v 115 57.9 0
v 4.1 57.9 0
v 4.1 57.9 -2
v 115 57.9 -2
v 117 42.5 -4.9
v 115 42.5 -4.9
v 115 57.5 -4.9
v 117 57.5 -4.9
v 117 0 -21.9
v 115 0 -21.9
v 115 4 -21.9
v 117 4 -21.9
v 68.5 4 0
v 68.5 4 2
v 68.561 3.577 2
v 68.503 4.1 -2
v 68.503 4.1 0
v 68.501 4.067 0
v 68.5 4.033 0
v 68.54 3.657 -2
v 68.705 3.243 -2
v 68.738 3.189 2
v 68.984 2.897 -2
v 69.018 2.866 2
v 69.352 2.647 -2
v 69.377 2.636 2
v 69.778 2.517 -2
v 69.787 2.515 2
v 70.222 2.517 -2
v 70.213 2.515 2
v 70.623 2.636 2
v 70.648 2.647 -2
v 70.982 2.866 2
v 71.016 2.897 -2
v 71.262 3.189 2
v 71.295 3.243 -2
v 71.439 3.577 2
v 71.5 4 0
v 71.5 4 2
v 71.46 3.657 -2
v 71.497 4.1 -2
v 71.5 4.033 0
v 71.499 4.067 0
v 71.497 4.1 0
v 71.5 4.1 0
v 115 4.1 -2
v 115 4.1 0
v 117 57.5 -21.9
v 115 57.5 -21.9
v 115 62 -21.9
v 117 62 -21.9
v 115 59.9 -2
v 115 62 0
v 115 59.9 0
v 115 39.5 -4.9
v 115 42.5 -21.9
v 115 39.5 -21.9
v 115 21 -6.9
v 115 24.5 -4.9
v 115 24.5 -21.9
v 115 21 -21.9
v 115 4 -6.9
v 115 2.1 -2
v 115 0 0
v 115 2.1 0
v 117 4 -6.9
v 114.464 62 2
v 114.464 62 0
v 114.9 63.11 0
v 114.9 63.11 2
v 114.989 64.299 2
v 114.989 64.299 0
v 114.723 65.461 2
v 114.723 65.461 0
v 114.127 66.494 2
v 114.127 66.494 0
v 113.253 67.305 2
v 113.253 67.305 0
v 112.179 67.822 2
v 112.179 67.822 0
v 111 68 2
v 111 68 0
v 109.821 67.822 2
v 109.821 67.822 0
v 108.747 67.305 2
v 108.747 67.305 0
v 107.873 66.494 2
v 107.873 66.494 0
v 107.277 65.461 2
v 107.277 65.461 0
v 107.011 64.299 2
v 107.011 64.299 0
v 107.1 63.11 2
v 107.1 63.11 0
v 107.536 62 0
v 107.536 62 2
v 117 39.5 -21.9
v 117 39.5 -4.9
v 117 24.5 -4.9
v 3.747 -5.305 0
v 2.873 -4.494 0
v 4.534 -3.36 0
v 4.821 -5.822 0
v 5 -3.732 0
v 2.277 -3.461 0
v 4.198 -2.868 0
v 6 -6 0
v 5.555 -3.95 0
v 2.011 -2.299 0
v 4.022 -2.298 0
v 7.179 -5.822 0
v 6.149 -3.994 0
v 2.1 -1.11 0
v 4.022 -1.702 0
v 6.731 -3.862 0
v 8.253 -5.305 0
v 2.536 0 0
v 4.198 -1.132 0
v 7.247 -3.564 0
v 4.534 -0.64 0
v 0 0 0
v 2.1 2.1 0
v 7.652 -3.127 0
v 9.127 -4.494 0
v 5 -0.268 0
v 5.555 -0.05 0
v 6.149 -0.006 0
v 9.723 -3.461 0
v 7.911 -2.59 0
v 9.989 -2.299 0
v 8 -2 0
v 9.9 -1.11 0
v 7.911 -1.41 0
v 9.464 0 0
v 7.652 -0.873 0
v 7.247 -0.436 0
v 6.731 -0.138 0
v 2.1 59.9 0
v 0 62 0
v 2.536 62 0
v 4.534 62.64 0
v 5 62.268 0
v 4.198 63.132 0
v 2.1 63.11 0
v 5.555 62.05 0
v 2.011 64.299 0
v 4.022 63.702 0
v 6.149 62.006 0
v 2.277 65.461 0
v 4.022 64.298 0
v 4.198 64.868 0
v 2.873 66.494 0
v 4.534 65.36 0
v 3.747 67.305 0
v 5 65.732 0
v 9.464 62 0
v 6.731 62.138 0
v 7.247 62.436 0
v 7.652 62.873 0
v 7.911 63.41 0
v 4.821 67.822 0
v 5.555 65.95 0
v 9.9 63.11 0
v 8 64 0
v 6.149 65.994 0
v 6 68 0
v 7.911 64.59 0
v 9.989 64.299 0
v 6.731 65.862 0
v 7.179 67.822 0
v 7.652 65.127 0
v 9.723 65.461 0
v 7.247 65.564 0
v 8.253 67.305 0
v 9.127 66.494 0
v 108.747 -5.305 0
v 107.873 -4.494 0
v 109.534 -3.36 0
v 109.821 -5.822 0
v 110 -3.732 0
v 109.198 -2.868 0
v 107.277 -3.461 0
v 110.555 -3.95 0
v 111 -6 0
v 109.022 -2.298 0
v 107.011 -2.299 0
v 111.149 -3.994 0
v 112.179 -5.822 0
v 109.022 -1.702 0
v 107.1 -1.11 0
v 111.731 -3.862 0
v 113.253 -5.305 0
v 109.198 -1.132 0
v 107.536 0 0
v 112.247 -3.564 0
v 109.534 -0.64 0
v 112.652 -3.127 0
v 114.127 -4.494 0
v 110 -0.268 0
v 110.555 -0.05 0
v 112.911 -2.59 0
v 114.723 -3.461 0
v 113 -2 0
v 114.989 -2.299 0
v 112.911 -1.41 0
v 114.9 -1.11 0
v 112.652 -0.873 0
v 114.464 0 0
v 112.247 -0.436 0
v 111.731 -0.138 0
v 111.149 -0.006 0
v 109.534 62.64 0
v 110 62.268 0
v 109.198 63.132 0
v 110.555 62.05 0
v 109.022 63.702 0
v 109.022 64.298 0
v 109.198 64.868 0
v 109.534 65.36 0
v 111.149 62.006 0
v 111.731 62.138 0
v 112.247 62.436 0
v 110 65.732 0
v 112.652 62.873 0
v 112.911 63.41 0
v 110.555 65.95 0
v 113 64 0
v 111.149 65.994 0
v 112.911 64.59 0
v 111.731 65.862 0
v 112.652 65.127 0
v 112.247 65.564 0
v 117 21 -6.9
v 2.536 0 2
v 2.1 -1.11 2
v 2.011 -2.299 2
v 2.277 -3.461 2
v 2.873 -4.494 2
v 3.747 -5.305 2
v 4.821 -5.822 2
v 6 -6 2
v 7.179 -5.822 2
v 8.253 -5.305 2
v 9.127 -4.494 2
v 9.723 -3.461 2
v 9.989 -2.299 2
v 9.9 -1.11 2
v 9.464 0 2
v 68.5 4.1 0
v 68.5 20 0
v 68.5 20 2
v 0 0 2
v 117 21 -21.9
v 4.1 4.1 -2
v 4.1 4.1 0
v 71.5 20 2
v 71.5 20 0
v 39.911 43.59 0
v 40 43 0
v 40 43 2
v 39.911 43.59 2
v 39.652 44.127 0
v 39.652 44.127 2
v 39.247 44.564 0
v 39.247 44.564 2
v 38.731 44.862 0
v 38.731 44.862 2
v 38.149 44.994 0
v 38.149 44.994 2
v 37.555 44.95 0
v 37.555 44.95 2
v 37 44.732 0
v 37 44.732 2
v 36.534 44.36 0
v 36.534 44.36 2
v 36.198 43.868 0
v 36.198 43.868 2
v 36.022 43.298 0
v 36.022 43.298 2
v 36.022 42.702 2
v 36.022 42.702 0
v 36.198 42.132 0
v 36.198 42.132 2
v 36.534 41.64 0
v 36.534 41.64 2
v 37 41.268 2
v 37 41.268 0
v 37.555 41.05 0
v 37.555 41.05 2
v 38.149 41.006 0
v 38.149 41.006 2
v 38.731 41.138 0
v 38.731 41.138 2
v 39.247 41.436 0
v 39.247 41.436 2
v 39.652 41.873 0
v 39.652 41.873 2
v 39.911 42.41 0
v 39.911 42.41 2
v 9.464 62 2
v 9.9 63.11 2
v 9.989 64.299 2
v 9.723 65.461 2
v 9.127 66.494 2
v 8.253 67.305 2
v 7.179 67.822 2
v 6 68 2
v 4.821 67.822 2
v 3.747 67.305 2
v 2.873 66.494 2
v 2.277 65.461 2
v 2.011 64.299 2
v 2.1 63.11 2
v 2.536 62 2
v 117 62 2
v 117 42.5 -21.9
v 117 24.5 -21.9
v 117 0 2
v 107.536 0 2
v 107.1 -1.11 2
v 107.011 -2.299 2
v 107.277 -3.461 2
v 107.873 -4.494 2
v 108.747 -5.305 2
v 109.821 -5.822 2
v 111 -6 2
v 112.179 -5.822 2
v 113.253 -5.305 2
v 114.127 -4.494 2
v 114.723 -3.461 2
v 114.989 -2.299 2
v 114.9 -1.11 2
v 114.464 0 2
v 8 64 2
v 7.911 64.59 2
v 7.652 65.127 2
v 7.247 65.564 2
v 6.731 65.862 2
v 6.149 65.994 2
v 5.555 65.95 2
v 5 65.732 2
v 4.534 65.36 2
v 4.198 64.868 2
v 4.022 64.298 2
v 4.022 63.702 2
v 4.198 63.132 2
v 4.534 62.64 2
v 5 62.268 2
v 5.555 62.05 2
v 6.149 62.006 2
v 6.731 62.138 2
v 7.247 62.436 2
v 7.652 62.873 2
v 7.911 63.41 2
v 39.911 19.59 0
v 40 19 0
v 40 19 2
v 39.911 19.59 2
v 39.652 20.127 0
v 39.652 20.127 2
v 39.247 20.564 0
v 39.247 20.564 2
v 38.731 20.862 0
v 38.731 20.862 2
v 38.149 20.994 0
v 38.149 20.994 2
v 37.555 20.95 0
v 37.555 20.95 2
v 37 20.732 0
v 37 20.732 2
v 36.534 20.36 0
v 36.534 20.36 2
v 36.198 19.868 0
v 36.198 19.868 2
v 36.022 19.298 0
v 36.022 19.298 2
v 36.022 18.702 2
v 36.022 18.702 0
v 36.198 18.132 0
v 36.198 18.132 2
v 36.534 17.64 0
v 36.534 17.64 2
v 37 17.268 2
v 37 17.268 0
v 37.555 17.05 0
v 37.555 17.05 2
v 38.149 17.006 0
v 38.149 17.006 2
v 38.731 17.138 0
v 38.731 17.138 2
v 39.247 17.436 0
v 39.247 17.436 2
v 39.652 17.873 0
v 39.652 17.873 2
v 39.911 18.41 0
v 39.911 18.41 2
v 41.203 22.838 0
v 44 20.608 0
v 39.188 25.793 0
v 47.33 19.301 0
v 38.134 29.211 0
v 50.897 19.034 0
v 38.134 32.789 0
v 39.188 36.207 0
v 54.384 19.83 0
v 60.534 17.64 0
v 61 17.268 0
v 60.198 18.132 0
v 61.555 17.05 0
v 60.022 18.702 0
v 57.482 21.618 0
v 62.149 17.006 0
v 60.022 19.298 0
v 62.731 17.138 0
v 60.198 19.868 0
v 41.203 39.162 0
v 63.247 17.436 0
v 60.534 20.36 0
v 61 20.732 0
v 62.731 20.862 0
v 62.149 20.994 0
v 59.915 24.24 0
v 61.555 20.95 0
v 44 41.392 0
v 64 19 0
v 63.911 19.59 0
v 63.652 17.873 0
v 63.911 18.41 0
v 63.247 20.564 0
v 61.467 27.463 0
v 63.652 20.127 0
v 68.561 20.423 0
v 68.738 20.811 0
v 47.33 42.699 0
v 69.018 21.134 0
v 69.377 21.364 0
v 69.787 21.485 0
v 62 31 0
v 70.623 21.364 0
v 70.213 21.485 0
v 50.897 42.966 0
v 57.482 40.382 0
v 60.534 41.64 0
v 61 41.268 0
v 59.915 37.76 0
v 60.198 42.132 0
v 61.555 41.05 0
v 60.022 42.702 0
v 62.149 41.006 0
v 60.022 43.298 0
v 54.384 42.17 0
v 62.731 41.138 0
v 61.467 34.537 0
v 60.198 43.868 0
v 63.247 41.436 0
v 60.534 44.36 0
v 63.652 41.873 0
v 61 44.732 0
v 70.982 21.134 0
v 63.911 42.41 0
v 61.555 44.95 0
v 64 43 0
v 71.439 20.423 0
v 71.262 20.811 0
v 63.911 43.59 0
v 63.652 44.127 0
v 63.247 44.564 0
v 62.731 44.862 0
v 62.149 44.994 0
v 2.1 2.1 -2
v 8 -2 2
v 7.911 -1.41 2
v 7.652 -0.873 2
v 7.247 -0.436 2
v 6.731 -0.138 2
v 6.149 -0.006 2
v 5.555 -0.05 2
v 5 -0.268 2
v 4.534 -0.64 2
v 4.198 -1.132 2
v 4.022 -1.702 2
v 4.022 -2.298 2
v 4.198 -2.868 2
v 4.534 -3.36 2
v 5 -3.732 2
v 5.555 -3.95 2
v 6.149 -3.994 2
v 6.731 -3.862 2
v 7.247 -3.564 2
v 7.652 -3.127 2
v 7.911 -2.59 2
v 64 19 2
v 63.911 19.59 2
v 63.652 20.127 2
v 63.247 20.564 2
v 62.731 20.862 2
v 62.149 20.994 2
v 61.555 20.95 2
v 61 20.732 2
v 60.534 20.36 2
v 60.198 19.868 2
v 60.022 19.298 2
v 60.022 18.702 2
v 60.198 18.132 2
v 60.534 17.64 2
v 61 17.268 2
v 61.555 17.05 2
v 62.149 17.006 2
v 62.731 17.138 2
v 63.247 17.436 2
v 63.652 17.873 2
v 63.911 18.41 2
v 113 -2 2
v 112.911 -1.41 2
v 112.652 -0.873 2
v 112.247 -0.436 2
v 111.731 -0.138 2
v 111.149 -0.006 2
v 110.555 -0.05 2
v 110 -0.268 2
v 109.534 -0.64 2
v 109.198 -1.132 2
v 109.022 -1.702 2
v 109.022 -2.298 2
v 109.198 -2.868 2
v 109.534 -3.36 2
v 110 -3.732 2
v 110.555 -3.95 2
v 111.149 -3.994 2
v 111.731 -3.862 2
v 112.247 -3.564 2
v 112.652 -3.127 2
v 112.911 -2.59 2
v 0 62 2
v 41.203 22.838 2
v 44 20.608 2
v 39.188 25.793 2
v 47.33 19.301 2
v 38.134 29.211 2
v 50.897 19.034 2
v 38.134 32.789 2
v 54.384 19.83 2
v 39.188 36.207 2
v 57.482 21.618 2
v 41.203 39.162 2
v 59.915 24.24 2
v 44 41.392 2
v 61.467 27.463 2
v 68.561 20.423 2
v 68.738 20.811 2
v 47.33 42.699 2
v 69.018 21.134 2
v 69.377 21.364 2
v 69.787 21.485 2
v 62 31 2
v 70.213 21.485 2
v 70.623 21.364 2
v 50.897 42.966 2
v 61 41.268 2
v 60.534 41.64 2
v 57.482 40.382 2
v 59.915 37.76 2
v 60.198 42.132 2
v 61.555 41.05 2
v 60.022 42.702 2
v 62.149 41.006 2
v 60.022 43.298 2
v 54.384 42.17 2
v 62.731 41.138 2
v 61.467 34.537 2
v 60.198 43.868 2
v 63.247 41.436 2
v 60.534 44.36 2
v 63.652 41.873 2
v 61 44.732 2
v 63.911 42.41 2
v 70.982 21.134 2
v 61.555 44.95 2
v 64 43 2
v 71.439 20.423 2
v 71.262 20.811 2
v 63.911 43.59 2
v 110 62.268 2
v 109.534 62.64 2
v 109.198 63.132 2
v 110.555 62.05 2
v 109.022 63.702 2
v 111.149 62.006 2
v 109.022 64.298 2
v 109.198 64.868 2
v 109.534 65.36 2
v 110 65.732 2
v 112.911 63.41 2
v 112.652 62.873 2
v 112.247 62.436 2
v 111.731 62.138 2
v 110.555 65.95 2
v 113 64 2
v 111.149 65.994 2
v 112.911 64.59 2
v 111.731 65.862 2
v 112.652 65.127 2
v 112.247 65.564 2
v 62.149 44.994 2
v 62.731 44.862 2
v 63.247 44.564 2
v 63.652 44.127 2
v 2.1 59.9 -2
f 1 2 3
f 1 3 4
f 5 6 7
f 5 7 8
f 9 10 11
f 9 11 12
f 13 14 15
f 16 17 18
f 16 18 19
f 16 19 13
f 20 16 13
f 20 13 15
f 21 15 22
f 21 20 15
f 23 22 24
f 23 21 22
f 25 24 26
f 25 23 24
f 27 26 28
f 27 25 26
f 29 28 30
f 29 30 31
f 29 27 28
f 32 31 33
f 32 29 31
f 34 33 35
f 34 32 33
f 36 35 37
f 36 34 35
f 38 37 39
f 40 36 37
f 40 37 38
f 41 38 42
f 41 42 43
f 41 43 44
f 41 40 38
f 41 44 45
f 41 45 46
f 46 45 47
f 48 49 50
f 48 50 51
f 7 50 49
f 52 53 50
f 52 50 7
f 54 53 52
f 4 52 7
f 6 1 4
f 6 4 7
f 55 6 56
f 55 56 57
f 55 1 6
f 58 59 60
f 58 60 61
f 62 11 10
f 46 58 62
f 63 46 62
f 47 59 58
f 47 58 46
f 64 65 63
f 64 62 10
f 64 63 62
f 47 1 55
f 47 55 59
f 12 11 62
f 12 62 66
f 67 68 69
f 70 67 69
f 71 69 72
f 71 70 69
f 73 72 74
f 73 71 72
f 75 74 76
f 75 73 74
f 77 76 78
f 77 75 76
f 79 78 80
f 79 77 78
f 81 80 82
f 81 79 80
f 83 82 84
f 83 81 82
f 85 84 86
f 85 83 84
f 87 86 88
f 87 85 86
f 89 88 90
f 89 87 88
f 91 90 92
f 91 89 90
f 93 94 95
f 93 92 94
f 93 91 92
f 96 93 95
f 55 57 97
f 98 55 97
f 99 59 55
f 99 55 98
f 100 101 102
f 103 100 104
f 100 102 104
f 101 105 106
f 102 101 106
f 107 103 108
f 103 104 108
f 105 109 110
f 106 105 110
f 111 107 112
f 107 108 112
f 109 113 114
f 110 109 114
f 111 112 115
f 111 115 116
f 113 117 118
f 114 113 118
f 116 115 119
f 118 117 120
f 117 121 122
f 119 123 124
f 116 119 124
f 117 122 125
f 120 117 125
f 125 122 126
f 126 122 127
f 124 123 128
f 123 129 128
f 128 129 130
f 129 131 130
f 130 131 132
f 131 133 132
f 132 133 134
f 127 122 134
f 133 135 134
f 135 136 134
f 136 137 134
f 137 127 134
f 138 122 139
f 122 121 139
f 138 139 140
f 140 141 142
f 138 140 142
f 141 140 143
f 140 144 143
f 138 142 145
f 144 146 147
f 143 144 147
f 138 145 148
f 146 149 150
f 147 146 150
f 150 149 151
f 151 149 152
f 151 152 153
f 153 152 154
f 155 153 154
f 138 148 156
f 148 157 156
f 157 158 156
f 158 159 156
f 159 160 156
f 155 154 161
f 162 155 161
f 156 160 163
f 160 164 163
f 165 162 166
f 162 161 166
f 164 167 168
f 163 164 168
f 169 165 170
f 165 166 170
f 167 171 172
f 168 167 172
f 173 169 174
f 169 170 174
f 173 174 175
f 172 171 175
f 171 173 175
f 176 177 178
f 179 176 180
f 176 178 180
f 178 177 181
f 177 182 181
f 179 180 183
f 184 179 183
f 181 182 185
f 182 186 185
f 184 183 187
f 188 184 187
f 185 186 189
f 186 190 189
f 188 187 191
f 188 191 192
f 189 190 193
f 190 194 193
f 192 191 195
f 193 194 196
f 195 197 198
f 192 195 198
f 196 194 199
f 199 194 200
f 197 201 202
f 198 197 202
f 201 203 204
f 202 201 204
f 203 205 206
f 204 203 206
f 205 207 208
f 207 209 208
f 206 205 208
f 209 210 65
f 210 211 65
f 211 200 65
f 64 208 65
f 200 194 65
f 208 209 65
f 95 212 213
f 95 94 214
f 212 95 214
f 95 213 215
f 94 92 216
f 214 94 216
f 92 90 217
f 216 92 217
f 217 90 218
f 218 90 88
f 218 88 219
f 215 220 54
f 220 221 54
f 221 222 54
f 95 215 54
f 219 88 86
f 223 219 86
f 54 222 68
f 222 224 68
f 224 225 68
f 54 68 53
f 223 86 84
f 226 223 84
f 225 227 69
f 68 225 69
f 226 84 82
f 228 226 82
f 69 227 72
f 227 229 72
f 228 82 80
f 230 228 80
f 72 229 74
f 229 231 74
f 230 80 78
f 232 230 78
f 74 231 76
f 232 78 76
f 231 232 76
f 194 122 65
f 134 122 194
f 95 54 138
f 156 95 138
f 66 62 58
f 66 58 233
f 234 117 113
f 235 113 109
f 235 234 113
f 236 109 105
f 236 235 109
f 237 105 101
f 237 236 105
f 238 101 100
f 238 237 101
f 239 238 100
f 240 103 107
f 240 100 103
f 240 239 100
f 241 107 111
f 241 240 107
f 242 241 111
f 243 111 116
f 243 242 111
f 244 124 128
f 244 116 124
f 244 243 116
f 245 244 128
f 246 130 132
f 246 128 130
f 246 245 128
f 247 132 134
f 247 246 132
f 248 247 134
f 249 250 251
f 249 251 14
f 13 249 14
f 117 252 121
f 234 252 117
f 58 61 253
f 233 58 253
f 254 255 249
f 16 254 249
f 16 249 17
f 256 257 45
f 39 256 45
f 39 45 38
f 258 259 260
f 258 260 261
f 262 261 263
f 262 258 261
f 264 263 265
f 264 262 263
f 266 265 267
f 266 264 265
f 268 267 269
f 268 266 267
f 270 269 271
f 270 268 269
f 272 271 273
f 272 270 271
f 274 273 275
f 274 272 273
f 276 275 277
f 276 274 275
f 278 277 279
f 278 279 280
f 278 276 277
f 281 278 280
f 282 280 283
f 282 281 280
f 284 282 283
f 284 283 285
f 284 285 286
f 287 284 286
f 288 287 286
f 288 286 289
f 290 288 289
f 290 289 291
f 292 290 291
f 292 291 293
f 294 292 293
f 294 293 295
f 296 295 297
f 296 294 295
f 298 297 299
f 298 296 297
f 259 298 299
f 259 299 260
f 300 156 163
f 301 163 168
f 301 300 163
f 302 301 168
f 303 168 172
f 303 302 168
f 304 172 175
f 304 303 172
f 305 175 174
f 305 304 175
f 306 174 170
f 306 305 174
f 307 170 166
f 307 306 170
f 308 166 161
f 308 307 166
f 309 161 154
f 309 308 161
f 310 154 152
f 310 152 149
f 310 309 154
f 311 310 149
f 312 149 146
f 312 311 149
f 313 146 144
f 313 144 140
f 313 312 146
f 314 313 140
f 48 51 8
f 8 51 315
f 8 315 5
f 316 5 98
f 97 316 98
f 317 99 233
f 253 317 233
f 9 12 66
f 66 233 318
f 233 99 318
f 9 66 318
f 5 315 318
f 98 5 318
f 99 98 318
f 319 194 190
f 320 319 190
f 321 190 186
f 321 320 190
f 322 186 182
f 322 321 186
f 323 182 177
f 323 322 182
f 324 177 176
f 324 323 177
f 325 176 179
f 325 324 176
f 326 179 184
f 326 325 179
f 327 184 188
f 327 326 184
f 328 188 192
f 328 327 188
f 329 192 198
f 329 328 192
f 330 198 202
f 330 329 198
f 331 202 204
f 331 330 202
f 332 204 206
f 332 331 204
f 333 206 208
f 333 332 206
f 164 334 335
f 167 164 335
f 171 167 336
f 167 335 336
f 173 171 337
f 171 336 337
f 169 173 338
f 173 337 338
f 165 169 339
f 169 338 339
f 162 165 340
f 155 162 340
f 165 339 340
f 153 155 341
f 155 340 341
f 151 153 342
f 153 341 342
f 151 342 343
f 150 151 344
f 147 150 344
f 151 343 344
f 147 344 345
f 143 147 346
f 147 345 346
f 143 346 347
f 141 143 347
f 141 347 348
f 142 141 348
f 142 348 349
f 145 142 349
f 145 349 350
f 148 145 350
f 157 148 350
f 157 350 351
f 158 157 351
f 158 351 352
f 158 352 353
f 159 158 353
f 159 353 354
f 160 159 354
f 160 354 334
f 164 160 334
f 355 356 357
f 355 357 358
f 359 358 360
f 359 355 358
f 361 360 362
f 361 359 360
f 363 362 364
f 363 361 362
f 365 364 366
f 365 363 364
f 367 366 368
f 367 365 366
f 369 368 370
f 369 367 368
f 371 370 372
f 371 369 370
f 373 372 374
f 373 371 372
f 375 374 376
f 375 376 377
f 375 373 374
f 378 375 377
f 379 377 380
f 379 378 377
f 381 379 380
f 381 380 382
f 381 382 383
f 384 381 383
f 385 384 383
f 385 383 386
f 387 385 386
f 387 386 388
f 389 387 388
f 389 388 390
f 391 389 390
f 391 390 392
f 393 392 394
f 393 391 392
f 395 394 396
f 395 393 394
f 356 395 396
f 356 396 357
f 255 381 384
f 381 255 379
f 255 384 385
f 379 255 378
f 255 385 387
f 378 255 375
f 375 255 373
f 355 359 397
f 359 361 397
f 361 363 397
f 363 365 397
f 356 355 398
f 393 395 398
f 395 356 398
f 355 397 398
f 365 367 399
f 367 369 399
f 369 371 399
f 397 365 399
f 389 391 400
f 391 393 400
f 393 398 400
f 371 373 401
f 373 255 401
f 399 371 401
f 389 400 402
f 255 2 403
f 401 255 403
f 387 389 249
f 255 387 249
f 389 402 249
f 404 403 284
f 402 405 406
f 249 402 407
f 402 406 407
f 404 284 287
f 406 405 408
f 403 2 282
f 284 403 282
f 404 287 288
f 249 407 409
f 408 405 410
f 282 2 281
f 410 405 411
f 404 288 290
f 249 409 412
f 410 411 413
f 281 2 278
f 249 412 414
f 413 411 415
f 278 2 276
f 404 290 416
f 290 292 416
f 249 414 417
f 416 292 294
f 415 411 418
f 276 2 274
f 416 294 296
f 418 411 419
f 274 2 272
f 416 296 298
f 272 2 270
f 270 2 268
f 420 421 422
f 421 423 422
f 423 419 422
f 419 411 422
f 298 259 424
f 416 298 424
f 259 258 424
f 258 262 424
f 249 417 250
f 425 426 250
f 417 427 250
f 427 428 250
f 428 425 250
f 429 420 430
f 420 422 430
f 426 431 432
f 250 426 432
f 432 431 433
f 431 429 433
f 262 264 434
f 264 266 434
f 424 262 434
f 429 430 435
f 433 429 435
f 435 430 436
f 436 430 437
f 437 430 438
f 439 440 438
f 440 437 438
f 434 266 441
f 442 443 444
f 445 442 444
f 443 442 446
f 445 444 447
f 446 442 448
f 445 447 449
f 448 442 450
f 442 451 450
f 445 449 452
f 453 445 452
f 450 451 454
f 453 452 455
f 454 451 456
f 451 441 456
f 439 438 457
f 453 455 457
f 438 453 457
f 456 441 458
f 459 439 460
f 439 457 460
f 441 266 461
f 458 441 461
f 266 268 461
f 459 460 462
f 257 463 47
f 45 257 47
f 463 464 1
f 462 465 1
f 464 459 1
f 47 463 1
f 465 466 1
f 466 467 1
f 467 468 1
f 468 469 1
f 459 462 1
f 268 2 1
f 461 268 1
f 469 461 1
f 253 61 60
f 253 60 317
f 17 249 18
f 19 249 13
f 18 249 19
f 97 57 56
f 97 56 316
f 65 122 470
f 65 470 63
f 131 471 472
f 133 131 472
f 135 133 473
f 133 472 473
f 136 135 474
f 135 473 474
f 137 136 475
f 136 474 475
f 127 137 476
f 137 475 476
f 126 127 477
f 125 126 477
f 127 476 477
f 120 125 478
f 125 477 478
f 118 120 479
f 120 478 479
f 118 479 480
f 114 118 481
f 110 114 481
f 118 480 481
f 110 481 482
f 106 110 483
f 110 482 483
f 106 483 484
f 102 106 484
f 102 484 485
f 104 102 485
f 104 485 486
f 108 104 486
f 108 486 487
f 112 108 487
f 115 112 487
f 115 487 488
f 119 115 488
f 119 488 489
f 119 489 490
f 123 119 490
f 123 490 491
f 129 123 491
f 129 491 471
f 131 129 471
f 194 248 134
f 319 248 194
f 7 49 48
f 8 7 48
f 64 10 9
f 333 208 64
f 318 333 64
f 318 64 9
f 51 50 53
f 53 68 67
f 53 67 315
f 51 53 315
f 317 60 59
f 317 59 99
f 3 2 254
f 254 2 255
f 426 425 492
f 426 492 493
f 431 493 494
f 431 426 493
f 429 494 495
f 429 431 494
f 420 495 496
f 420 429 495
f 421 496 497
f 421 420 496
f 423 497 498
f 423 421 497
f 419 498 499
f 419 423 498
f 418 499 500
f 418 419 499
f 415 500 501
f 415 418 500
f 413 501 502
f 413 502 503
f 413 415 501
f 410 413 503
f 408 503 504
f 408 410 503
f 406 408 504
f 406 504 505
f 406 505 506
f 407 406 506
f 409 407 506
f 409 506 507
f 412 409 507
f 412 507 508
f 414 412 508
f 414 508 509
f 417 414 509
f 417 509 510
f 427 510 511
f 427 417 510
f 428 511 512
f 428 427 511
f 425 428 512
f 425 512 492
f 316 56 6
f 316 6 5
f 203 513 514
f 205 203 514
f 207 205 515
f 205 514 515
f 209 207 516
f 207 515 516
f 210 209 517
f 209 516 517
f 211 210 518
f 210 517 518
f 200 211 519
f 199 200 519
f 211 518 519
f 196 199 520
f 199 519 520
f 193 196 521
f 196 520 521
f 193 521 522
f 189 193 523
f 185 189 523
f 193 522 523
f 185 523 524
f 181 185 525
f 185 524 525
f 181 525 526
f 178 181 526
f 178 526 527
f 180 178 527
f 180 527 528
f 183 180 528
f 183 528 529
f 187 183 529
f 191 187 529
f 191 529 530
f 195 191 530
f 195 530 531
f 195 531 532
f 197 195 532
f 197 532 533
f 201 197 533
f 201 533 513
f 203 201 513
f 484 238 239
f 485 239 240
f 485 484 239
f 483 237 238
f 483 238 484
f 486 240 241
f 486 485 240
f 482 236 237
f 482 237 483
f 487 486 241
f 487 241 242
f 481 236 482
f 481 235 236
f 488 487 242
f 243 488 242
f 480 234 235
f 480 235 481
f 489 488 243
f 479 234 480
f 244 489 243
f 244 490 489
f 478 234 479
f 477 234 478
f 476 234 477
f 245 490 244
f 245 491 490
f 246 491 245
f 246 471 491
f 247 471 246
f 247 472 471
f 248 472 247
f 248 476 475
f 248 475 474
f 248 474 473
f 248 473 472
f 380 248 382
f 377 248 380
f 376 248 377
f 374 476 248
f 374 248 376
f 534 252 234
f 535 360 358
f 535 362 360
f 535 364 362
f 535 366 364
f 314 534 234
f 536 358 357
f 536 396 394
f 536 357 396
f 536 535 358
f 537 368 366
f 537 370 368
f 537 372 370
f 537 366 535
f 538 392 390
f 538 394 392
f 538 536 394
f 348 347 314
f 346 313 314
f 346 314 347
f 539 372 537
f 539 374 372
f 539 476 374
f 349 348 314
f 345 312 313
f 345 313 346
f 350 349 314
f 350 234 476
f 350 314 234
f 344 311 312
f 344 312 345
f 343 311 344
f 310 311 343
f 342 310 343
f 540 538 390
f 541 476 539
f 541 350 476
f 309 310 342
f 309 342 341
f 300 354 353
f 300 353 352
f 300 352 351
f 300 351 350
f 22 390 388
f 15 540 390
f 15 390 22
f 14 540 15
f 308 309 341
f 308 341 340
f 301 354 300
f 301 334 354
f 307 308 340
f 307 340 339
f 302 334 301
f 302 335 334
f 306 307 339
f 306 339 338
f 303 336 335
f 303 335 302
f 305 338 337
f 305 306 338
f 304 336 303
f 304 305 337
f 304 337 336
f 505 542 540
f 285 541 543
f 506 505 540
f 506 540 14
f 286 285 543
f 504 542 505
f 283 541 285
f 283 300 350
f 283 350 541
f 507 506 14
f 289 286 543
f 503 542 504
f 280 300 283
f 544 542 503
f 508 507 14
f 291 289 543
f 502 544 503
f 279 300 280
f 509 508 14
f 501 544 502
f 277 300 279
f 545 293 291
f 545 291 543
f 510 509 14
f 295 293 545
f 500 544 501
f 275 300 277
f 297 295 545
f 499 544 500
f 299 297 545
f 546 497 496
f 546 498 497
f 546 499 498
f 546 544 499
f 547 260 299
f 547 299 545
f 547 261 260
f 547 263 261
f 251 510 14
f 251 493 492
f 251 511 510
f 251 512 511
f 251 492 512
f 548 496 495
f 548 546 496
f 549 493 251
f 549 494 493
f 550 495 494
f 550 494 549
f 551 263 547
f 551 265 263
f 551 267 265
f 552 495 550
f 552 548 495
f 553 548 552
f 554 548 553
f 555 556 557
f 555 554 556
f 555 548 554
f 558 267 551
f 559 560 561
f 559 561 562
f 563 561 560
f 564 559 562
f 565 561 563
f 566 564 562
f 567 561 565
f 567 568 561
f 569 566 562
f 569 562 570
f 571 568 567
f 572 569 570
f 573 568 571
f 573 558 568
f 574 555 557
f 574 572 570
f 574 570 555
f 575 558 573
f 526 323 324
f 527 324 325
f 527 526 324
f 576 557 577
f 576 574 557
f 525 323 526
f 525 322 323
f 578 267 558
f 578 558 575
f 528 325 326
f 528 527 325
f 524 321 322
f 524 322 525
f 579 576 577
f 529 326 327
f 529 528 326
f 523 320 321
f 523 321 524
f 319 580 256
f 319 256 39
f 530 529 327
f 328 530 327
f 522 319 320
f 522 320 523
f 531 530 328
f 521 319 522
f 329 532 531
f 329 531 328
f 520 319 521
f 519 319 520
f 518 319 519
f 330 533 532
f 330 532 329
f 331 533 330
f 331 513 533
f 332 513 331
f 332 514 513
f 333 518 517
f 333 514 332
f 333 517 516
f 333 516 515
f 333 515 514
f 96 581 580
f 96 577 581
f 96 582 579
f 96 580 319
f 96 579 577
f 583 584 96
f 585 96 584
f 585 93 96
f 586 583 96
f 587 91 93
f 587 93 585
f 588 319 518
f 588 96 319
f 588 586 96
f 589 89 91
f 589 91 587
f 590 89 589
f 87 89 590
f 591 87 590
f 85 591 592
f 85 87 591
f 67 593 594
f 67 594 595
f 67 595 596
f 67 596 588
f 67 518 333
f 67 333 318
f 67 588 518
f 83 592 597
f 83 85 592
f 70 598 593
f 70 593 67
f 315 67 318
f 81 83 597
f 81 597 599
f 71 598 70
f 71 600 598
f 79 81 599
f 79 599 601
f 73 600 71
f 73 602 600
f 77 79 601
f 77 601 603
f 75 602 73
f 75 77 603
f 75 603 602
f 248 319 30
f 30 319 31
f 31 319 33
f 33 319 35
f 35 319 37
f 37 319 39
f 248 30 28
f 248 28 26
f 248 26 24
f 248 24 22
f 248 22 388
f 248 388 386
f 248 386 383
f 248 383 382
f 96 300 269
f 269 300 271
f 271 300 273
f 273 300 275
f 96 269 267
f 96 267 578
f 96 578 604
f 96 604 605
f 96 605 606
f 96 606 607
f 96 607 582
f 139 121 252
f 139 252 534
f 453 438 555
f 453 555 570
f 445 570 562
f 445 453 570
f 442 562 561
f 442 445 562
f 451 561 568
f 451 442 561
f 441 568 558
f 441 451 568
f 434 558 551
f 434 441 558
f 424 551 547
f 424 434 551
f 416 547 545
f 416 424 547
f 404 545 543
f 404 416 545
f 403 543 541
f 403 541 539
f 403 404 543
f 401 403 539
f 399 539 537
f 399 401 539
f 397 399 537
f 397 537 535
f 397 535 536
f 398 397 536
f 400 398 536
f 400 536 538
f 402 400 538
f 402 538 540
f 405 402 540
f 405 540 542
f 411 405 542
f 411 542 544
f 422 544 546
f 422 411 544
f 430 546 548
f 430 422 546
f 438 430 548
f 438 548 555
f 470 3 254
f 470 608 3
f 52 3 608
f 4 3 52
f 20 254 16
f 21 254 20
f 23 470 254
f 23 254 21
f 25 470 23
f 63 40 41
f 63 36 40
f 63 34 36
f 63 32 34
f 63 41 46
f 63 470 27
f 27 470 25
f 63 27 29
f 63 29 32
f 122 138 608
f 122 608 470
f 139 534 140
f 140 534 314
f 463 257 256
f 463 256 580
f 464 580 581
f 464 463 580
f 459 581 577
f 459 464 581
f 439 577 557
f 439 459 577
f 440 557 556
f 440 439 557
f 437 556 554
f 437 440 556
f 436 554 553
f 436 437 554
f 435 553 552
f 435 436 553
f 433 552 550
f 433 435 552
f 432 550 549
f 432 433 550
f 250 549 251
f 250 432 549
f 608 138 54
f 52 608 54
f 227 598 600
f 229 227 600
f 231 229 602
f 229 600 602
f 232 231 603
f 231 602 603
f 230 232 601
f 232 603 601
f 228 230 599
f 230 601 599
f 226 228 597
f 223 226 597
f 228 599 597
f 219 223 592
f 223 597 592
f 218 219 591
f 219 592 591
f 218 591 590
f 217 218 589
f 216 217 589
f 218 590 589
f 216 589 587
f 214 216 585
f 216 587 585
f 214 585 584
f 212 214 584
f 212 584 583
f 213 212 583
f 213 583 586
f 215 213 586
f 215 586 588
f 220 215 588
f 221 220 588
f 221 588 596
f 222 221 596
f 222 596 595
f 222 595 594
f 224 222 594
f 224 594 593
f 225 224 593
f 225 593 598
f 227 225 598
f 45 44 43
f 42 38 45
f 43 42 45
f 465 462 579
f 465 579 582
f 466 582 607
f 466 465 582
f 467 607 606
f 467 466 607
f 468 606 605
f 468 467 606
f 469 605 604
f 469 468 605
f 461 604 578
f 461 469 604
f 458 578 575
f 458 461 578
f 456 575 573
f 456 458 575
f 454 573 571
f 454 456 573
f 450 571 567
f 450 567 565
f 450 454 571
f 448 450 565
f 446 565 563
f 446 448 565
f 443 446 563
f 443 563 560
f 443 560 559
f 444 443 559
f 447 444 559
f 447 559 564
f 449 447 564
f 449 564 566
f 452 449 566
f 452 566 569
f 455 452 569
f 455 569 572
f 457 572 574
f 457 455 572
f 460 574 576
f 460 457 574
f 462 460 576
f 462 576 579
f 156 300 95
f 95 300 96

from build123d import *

# Parameters (mm, degrees)
SKETCH_W        = 117
SKETCH_H        = 62
SKETCH_R        = 2
SKETCH_R_2      = 12
PAD_DEPTH       = 2
SKETCH001_W     = 114.9
SKETCH001_H     = 57.8
SKETCH001_W_2   = 110.9
SKETCH001_H_2   = 53.8
SKETCH001_W_3   = 2
SKETCH001_H_3   = 2.1
PAD001_DEPTH    = 2
SKETCH003_R     = 2
POCKET_DEPTH    = 2
SKETCH005_W     = 2
SKETCH005_H     = 62
PAD002_DEPTH    = 19.9
SKETCH006_W     = 2
SKETCH006_H     = 17
POCKET001_DEPTH = 15
SKETCH007_W     = 2
SKETCH007_H     = 15
POCKET002_DEPTH = 17
SKETCH008_R     = 4
SKETCH008_R_2   = 2
PAD003_DEPTH    = 2
SKETCH009_R     = 1.5
POCKET003_DEPTH = 5


with BuildPart() as part:
    # Sketch → Pad (new body)
    with BuildSketch(Plane.XY):
        with Locations((58.5, 31)):
            Rectangle(SKETCH_W, SKETCH_H)
        with Locations((38, 43)):
            Circle(SKETCH_R, mode=Mode.SUBTRACT)
        with Locations((62, 43)):
            Circle(SKETCH_R, mode=Mode.SUBTRACT)
        with Locations((38, 19)):
            Circle(SKETCH_R, mode=Mode.SUBTRACT)
        with Locations((62, 19)):
            Circle(SKETCH_R, mode=Mode.SUBTRACT)
        with Locations((50, 31)):
            Circle(SKETCH_R_2, mode=Mode.SUBTRACT)
        with BuildLine():
            ThreePointArc((71.5, 20), (70, 21.5), (68.5, 20))
            Line((68.5, 20), (68.5, 4))
            ThreePointArc((68.5, 4), (70, 2.5), (71.5, 4))
            Line((71.5, 20), (71.5, 4))
        make_face(mode=Mode.SUBTRACT)
    extrude(amount=PAD_DEPTH)

    # Sketch001 (on Face14 of Pad) → Pad001 (join)
    with BuildSketch(Plane(origin=(0, 0, 0), x_dir=(1, 0, 0), z_dir=(0, 0, -1))):
        with Locations((59.55, -31)):
            Rectangle(SKETCH001_W, SKETCH001_H)
        with Locations((59.55, -31)):
            Rectangle(SKETCH001_W_2, SKETCH001_H_2, mode=Mode.SUBTRACT)
        with Locations((116, -1.05)):
            Rectangle(SKETCH001_W_3, SKETCH001_H_3)
        with Locations((116, -60.95)):
            Rectangle(SKETCH001_W_3, SKETCH001_H_3)
    extrude(amount=PAD001_DEPTH)

    # Sketch003 → Pocket (cut)
    with BuildSketch(Plane.XY.offset(2)):
        with Locations((6, 64)):
            Circle(SKETCH003_R)
        with Locations((113, 64)):
            Circle(SKETCH003_R)
        with Locations((6, -2)):
            Circle(SKETCH003_R)
        with Locations((113, -2)):
            Circle(SKETCH003_R)
    extrude(amount=-POCKET_DEPTH, mode=Mode.SUBTRACT)

    # Sketch005 (on Face16 of Pad001) → Pad002 (join)
    with BuildSketch(Plane(origin=(0, 0, -2), x_dir=(1, 0, 0), z_dir=(0, 0, -1))):
        with Locations((116, -31)):
            Rectangle(SKETCH005_W, SKETCH005_H)
    extrude(amount=PAD002_DEPTH)

    # Sketch006 (on Face37 of Pad002) → Pocket001 (cut)
    with BuildSketch(Plane(origin=(0, 0, -21.9), x_dir=(1, 0, 0), z_dir=(0, 0, -1))):
        with Locations((116, -12.5)):
            Rectangle(SKETCH006_W, SKETCH006_H)
    extrude(amount=-POCKET001_DEPTH, mode=Mode.SUBTRACT)

    # Sketch007 (on Face41 of Pocket001) → Pocket002 (cut)
    with BuildSketch(Plane(origin=(0, 0, -21.9), x_dir=(1, 0, 0), z_dir=(0, 0, -1))):
        with Locations((116, -32)):
            Rectangle(SKETCH007_W, SKETCH007_H)
        with Locations((116, -50)):
            Rectangle(SKETCH007_W, SKETCH007_H)
    extrude(amount=-POCKET002_DEPTH, mode=Mode.SUBTRACT)

    # Sketch008 (on Face4 of Pocket002) → Pad003 (join)
    with BuildSketch(Plane.XY.offset(2)):
        with Locations((6, 64)):
            Circle(SKETCH008_R)
        with Locations((6, 64)):
            Circle(SKETCH008_R_2, mode=Mode.SUBTRACT)
        with Locations((111, 64)):
            Circle(SKETCH008_R)
        with Locations((111, 64)):
            Circle(SKETCH008_R_2, mode=Mode.SUBTRACT)
        with Locations((6, -2)):
            Circle(SKETCH008_R)
        with Locations((6, -2)):
            Circle(SKETCH008_R_2, mode=Mode.SUBTRACT)
        with Locations((111, -2)):
            Circle(SKETCH008_R)
        with Locations((111, -2)):
            Circle(SKETCH008_R_2, mode=Mode.SUBTRACT)
    extrude(amount=-PAD003_DEPTH)

    # Sketch009 (on Face59 of Pad003) → Pocket003 (cut)
    with BuildSketch(Plane.XY):
        with Locations((70, 4)):
            Circle(SKETCH009_R)
    extrude(amount=-POCKET003_DEPTH, mode=Mode.SUBTRACT)


solid = part.part
